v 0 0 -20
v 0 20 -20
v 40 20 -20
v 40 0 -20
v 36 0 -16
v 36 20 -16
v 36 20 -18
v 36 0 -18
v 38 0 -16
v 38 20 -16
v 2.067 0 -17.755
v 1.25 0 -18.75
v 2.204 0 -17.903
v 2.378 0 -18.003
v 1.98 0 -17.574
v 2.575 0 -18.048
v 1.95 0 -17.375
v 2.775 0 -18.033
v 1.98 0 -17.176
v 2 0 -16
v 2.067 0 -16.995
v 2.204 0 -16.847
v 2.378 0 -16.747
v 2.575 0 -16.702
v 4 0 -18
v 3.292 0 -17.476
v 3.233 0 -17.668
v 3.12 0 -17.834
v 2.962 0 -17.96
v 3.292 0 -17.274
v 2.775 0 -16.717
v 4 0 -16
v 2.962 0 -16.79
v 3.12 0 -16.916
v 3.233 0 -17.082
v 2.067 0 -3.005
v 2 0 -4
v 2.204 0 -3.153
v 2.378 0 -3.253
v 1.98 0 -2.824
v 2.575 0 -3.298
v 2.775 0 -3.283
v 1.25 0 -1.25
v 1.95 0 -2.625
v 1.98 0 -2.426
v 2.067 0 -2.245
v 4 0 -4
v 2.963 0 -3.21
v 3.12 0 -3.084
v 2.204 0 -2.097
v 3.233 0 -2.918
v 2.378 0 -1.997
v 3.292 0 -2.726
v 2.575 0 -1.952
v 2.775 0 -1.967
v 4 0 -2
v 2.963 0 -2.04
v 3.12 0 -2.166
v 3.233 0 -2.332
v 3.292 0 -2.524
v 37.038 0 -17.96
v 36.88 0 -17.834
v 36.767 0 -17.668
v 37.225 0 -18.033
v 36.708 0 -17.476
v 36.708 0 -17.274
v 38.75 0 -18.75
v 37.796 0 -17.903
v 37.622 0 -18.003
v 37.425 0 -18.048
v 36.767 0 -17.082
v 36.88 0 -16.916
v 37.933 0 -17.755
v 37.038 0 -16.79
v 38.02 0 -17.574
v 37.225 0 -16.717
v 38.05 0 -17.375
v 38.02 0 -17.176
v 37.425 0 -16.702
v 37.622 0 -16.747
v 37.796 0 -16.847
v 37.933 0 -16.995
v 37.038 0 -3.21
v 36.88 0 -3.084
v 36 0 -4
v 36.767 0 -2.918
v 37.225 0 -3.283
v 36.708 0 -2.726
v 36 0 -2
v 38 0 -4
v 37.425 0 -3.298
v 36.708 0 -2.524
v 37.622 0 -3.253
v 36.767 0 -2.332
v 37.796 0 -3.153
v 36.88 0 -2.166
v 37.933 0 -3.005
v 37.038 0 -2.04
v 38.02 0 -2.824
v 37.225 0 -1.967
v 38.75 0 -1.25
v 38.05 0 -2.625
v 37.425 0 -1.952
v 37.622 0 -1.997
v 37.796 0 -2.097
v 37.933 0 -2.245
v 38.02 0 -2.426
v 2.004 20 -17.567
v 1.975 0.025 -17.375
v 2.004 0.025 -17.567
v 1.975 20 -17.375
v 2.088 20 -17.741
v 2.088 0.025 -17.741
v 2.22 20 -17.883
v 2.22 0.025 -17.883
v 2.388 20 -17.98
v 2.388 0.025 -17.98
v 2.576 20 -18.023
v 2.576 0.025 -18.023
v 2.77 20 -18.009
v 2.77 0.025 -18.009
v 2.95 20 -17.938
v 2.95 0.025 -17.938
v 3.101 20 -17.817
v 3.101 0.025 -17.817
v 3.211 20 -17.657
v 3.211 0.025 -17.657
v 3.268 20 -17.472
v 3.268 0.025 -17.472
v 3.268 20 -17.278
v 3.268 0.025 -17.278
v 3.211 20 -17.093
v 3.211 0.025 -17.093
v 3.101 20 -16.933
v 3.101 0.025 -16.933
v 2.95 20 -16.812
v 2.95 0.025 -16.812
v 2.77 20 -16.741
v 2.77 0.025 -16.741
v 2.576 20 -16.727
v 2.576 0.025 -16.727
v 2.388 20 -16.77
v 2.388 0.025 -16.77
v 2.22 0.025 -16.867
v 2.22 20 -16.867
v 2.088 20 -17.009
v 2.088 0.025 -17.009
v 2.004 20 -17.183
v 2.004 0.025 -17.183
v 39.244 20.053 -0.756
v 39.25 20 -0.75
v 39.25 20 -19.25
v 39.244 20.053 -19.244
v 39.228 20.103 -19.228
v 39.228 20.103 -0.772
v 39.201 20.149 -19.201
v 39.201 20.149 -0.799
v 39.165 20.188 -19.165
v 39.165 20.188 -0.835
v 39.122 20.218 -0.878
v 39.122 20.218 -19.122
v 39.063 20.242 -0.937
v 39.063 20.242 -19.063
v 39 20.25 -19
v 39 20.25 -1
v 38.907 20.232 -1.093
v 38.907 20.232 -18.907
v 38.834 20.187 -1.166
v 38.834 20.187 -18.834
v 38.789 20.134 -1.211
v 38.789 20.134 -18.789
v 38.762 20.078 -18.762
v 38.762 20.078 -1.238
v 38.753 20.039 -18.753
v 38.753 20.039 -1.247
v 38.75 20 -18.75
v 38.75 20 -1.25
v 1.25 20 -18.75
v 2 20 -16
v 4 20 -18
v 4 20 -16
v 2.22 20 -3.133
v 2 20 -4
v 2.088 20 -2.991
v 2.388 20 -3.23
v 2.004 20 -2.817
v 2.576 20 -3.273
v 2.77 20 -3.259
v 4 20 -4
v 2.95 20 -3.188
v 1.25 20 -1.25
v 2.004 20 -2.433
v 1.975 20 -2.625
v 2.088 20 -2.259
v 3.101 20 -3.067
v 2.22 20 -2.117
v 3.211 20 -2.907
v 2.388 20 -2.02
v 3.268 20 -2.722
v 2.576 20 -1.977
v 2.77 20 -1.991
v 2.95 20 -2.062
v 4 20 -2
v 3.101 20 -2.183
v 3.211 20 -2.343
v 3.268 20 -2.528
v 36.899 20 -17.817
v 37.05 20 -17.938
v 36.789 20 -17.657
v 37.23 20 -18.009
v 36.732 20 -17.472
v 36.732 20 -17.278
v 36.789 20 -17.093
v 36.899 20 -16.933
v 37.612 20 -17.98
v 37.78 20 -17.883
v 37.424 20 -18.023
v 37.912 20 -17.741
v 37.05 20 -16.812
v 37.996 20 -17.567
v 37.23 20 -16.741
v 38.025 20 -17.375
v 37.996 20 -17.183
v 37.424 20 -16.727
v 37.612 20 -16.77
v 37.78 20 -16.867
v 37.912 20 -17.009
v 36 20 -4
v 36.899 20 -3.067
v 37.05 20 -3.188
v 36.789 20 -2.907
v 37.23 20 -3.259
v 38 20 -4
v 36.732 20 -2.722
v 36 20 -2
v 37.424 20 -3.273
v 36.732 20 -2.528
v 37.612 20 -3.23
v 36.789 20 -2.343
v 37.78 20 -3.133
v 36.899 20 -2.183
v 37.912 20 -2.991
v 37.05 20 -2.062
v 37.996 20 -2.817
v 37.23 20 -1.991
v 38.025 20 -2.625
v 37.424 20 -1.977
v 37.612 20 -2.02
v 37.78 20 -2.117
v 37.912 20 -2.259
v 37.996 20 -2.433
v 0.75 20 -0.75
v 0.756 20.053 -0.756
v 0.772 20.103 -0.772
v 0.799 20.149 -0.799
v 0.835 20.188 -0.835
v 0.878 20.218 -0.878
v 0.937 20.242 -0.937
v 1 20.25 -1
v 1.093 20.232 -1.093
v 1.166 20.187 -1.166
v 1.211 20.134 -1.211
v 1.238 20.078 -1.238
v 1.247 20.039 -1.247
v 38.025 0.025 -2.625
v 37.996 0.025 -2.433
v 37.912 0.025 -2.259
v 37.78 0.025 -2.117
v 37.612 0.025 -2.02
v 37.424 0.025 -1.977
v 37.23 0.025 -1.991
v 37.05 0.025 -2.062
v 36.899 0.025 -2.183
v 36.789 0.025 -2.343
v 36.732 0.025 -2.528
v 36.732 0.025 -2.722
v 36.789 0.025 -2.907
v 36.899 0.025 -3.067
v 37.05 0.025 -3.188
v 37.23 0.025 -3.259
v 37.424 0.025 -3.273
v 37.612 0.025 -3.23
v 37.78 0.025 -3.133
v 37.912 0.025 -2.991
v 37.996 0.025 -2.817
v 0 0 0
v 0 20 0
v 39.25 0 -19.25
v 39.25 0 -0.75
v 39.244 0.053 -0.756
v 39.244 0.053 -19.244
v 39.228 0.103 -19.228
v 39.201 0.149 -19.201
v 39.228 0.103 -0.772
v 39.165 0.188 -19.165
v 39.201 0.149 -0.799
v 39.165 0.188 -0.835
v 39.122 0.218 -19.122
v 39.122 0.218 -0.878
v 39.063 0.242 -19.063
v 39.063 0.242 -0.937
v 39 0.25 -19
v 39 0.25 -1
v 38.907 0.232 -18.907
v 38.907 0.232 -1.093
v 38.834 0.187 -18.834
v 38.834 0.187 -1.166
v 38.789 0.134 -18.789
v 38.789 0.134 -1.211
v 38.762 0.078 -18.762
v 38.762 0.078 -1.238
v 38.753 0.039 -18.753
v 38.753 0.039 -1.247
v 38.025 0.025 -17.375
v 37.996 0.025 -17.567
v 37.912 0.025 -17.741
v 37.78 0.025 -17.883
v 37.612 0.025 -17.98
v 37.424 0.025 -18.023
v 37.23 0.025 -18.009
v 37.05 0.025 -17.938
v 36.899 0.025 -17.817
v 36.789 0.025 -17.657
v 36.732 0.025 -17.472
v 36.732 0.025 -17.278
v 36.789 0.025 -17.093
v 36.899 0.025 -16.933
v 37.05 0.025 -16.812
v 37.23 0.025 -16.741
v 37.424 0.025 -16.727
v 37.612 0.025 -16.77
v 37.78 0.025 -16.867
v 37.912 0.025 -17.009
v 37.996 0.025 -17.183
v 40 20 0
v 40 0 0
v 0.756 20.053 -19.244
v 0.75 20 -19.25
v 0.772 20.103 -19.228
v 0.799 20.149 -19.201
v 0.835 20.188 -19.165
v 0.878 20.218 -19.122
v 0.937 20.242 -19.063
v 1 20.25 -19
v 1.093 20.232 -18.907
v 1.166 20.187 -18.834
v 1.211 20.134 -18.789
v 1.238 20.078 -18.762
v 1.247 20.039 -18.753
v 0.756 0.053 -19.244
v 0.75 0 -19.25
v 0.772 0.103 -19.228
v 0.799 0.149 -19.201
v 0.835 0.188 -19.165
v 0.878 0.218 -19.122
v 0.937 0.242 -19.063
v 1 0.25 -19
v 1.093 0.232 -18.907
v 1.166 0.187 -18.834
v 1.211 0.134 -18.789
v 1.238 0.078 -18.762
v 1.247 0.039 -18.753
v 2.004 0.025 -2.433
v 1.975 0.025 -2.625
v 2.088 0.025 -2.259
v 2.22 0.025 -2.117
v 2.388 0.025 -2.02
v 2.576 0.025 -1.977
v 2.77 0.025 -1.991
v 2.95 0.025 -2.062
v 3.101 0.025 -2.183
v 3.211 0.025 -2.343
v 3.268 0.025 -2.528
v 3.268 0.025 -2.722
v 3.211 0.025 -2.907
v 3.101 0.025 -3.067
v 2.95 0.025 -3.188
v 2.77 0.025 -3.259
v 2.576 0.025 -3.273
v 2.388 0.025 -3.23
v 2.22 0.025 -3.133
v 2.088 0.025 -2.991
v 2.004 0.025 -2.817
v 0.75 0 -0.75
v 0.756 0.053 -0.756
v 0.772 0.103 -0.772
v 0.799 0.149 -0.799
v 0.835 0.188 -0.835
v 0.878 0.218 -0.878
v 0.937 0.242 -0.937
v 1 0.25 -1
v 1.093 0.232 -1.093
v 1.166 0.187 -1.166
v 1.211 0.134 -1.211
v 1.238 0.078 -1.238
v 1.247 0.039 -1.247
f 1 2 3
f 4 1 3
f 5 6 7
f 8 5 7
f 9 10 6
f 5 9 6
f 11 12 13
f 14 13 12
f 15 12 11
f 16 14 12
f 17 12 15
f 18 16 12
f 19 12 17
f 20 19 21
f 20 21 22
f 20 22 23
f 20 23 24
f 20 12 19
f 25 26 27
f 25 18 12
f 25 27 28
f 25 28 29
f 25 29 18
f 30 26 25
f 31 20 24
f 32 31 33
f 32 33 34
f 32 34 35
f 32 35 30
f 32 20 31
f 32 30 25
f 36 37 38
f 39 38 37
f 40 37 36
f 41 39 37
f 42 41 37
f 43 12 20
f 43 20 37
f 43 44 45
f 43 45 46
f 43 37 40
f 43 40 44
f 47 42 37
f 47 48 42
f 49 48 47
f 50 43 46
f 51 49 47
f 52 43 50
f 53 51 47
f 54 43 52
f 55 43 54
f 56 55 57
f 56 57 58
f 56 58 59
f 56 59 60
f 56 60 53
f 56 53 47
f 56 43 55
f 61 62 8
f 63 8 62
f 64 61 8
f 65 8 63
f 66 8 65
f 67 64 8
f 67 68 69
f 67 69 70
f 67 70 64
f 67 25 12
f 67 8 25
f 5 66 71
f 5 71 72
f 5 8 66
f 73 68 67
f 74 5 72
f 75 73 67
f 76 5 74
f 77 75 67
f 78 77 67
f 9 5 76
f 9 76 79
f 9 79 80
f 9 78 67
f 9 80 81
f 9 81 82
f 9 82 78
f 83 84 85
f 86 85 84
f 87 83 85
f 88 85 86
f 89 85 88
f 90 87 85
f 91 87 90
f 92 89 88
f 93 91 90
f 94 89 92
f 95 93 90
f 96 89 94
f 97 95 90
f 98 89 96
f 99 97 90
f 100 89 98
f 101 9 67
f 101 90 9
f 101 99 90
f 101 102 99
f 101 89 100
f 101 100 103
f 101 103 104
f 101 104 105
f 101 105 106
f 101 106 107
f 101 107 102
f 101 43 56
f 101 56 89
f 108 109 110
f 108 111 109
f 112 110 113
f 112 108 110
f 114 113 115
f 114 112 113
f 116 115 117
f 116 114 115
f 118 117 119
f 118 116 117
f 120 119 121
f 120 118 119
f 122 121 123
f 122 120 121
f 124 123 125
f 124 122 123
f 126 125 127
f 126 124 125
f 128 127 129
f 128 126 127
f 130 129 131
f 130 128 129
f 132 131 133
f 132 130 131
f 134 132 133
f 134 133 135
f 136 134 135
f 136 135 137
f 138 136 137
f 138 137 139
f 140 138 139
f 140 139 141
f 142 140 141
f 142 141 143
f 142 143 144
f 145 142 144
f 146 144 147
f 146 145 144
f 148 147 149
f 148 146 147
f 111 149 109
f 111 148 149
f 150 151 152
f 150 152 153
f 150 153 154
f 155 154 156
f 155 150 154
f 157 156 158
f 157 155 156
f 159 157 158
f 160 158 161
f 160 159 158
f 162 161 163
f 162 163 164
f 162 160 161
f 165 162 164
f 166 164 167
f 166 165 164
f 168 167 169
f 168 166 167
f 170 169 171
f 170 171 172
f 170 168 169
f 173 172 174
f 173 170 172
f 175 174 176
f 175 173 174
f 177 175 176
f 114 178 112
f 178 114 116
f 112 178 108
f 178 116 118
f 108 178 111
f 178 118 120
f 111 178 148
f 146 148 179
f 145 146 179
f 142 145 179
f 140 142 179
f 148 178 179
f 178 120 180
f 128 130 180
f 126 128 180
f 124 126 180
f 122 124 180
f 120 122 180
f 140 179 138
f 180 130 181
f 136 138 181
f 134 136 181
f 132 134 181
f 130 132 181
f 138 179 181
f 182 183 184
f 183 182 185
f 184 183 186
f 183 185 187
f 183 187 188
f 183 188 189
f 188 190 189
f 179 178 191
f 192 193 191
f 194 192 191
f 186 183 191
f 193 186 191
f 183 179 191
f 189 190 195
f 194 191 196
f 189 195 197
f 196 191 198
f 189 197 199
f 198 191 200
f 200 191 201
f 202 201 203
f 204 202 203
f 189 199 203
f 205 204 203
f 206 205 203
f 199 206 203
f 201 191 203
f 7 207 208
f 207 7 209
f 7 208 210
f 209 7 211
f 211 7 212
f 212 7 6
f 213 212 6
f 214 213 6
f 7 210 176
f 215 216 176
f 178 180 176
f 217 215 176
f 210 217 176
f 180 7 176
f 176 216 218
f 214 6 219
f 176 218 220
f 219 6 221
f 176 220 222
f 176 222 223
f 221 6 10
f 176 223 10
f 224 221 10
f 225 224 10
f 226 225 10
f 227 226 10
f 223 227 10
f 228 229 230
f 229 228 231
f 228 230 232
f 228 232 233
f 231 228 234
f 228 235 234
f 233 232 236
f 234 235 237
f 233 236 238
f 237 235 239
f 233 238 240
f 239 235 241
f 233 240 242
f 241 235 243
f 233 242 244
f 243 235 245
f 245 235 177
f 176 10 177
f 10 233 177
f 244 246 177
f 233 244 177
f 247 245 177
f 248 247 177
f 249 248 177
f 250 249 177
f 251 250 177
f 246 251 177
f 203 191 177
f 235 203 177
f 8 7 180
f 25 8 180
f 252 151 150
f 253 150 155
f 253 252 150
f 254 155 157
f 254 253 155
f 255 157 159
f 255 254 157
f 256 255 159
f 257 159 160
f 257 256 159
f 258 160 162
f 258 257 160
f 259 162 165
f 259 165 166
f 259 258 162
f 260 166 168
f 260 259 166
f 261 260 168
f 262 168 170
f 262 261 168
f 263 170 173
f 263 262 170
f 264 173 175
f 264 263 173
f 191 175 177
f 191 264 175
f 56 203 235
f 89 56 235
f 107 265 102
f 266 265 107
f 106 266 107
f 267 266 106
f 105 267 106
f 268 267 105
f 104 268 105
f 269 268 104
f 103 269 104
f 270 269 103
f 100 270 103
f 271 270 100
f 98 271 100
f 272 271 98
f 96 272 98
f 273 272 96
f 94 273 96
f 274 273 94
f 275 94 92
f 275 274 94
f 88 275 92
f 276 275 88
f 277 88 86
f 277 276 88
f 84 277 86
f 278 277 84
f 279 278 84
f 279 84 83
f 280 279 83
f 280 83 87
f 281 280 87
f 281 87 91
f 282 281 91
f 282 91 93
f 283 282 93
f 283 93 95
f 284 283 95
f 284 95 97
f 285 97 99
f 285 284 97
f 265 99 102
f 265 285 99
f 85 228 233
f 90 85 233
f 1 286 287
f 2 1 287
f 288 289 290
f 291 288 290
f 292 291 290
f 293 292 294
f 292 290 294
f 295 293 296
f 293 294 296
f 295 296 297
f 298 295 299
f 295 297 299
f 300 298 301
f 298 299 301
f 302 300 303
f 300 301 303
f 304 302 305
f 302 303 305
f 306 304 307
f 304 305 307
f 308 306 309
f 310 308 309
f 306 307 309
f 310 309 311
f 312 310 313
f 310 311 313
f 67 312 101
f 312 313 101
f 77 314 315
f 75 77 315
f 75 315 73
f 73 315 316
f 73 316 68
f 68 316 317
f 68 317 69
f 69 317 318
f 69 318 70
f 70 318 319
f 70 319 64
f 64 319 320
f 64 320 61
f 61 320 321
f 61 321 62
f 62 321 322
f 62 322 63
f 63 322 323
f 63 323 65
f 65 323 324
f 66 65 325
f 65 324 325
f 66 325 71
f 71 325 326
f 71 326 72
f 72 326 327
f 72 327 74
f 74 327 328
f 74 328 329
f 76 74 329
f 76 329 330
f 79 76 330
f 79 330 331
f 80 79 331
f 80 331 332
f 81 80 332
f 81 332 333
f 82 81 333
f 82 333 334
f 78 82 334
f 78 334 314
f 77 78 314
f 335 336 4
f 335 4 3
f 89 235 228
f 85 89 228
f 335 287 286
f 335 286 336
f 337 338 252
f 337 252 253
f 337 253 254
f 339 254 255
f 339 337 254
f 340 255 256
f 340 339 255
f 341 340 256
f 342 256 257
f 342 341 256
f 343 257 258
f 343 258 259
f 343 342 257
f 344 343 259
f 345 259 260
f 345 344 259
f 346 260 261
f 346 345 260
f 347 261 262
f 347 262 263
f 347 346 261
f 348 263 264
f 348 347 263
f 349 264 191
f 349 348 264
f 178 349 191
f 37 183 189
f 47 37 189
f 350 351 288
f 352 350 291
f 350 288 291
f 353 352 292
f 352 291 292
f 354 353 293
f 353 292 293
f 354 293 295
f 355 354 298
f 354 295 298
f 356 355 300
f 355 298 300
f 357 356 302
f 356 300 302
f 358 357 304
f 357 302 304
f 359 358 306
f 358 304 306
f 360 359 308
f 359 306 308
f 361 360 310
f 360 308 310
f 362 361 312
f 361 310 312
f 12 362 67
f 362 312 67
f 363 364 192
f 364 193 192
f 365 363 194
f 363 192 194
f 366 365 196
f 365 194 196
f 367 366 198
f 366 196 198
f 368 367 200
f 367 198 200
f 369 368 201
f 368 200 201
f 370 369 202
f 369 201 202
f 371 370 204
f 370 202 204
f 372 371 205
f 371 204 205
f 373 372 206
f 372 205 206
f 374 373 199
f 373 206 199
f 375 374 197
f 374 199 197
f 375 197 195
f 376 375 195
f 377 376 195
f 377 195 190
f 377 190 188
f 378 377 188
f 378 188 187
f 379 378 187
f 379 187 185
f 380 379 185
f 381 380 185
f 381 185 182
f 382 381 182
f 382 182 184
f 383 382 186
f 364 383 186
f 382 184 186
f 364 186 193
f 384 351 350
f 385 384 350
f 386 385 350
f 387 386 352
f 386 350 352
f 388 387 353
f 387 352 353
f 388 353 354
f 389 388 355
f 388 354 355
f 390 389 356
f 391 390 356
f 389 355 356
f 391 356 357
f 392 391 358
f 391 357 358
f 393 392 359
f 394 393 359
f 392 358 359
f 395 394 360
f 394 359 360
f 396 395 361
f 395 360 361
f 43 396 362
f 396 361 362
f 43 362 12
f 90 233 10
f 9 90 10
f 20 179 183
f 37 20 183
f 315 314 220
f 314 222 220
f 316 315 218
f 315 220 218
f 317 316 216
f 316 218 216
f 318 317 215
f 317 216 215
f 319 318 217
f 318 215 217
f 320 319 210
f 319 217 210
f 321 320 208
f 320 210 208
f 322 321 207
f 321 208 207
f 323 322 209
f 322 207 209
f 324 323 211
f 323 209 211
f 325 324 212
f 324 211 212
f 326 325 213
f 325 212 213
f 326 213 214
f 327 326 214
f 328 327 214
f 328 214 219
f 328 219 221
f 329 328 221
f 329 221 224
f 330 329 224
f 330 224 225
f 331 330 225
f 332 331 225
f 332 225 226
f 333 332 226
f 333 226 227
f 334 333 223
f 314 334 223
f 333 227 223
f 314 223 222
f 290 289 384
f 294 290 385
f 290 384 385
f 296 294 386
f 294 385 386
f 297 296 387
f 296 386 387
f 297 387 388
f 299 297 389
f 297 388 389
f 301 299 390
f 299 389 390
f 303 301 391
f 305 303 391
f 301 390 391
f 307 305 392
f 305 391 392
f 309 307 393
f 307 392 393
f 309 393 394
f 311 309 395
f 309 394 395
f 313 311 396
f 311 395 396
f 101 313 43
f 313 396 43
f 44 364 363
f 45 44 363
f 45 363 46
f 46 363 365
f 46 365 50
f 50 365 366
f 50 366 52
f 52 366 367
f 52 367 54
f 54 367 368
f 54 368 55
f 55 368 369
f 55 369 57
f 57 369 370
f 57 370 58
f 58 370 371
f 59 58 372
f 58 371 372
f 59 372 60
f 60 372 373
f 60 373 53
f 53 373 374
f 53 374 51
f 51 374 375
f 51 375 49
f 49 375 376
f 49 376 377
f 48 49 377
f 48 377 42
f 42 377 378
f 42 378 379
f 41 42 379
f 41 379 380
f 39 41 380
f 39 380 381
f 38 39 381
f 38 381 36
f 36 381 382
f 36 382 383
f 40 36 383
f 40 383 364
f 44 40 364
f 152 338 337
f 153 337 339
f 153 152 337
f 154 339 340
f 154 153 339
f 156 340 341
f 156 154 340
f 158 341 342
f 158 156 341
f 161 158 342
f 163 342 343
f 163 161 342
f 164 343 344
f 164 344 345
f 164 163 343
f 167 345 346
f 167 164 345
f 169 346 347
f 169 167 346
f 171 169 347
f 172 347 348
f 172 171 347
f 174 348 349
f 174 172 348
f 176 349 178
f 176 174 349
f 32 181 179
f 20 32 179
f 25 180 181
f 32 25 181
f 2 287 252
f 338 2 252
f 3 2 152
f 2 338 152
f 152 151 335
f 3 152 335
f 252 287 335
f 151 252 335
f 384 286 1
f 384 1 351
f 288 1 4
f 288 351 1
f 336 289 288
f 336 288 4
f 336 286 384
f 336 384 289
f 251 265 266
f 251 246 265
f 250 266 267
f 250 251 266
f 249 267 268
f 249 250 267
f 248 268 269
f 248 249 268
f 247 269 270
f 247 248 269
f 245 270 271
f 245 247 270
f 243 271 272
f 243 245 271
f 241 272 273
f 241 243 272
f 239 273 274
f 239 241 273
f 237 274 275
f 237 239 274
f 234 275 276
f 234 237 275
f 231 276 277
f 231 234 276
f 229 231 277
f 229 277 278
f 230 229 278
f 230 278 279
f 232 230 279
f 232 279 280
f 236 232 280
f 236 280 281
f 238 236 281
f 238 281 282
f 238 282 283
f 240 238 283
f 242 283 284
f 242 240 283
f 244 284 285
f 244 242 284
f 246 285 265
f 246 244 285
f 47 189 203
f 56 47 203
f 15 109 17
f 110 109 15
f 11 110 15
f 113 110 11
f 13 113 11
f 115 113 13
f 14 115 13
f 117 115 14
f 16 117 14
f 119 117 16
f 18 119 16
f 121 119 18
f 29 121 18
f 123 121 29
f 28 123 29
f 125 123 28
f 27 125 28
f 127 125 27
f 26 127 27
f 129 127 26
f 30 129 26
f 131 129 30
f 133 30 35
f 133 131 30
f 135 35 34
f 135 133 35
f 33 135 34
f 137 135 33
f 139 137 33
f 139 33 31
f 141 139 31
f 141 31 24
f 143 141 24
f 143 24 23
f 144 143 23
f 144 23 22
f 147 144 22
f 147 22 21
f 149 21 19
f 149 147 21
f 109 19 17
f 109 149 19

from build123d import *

# Parameters (mm, degrees)
SCHIZZO1_W                     = 40
SCHIZZO1_H                     = 20
ESTRUSIONE_ESTRUSIONE1_DEPTH   = 20
TAGLIO_ESTRUSIONE1_DEPTH       = 20
FORO_PER_VITE_M1_1_D           = 1.3
FORO_PER_VITE_M1_1_CSINK_D     = 1.35
FORO_PER_VITE_M1_1_CSINK_ANGLE = 90
SPECCHIA2_COPY_1_D             = 1.3
SPECCHIA2_COPY_1_CSINK_D       = 1.35
SPECCHIA2_COPY_1_CSINK_ANGLE   = 90


with BuildPart() as part:
    # Schizzo1 → Estrusione-Estrusione1 (new body)
    with BuildSketch(Plane.XY):
        with Locations((20, 10)):
            Rectangle(SCHIZZO1_W, SCHIZZO1_H)
    extrude(amount=-ESTRUSIONE_ESTRUSIONE1_DEPTH)

    # Schizzo2 → Taglio-Estrusione1 (cut)
    with BuildSketch(Plane(origin=(0, 20, 0), x_dir=(1, 0, 0), z_dir=(0, 1, 0))):
        Polygon((4, 18), (4, 16), (2, 16), (2, 4), (4, 4), (4, 2), (36, 2), (36, 4), (38, 4), (38, 16), (36, 16), (36, 18), align=None)
    extrude(amount=-TAGLIO_ESTRUSIONE1_DEPTH, mode=Mode.SUBTRACT)

    # Sweep1: sweep along a path in Schizzo4
    with BuildLine(Plane(origin=(0, 20, 0), x_dir=(1, 0, 0), z_dir=(0, 1, 0))) as sweep1_path:
        Line((1, 19), (39, 19))
        Line((39, 19), (39, 1))
        Line((39, 1), (1, 1))
        Line((1, 1), (1, 19))
    # Schizzo3 → Sweep1 (sweep)
    with BuildSketch(Plane.XY.offset(-10)):
        with BuildLine():
            Line((0.75, 20), (1.25, 20))
            ThreePointArc((1.25, 20), (1, 20.25), (0.75, 20))
        make_face()
    sweep(path=sweep1_path.line, transition=Transition.RIGHT)

    # Taglia-Sweep1: sweep along a path in Schizzo5
    with BuildLine(Plane.XZ) as taglia_sweep1_path:
        Line((1, -19), (39, -19))
        Line((39, -19), (39, -1))
        Line((39, -1), (1, -1))
        Line((1, -1), (1, -19))
    # Schizzo6 → Taglia-Sweep1 (sweep, cut)
    with BuildSketch(Plane.XY.offset(-10)):
        with BuildLine():
            Line((0.75, 0), (1.25, 0))
            ThreePointArc((1.25, 0), (1, 0.25), (0.75, 0))
        make_face()
    sweep(path=taglia_sweep1_path.line, transition=Transition.RIGHT, mode=Mode.SUBTRACT)

    # Foro per Vite M1-1 (through all)
    with Locations(Plane(origin=(0, 0, 0), x_dir=(-1, 0, 0), z_dir=(0, -1, 0))):
        with Locations((-37.375, 17.375)):
            foro_per_vite_m1_1 = CounterSinkHole(FORO_PER_VITE_M1_1_D / 2, FORO_PER_VITE_M1_1_CSINK_D / 2, counter_sink_angle=FORO_PER_VITE_M1_1_CSINK_ANGLE)

    # Specchia1: Foro per Vite M1-1 across plane
    add(foro_per_vite_m1_1.mirror(Plane.XY.offset(-10)), mode=Mode.SUBTRACT)

    # Specchia2: Foro per Vite M1-1 across plane
    add(foro_per_vite_m1_1.mirror(Plane(origin=(20, 0, 0), x_dir=(0, 0, 1), z_dir=(1, 0, 0))), mode=Mode.SUBTRACT)

    # Specchia2 copy 1 (through all)
    with Locations(Plane(origin=(40, 0, -20), x_dir=(1, 0, 0), z_dir=(0, -1, 0))):
        with Locations((-37.375, 17.375)):
            CounterSinkHole(SPECCHIA2_COPY_1_D / 2, SPECCHIA2_COPY_1_CSINK_D / 2, counter_sink_angle=SPECCHIA2_COPY_1_CSINK_ANGLE)


solid = part.part
